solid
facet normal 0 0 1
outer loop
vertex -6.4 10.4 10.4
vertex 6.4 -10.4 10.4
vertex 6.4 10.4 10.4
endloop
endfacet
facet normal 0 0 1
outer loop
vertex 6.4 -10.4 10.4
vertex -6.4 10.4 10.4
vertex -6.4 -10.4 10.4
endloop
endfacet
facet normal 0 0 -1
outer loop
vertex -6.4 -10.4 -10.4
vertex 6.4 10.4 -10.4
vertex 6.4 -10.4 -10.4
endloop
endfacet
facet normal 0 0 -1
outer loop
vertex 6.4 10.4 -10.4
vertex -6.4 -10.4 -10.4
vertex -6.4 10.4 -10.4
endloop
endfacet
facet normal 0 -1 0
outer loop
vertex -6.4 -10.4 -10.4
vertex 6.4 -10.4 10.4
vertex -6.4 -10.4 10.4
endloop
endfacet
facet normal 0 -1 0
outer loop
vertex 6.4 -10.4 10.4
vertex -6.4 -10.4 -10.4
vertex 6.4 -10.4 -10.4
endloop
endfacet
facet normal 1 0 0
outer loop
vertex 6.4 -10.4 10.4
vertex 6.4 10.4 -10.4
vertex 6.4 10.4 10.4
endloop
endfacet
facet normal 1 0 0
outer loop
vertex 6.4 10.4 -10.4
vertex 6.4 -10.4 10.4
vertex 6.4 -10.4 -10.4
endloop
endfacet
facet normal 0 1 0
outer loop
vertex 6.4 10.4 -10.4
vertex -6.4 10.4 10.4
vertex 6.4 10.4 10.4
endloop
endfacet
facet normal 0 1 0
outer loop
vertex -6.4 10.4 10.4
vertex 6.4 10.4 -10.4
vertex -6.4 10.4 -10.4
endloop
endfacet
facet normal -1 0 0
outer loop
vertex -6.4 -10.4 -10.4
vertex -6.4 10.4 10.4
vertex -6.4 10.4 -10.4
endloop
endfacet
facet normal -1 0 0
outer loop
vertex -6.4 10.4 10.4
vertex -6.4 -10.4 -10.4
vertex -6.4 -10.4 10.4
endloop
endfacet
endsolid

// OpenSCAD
size = 32;//block=32 //item=8

cube([size * 0.40, size * 0.65, size * 0.65], center = true);
